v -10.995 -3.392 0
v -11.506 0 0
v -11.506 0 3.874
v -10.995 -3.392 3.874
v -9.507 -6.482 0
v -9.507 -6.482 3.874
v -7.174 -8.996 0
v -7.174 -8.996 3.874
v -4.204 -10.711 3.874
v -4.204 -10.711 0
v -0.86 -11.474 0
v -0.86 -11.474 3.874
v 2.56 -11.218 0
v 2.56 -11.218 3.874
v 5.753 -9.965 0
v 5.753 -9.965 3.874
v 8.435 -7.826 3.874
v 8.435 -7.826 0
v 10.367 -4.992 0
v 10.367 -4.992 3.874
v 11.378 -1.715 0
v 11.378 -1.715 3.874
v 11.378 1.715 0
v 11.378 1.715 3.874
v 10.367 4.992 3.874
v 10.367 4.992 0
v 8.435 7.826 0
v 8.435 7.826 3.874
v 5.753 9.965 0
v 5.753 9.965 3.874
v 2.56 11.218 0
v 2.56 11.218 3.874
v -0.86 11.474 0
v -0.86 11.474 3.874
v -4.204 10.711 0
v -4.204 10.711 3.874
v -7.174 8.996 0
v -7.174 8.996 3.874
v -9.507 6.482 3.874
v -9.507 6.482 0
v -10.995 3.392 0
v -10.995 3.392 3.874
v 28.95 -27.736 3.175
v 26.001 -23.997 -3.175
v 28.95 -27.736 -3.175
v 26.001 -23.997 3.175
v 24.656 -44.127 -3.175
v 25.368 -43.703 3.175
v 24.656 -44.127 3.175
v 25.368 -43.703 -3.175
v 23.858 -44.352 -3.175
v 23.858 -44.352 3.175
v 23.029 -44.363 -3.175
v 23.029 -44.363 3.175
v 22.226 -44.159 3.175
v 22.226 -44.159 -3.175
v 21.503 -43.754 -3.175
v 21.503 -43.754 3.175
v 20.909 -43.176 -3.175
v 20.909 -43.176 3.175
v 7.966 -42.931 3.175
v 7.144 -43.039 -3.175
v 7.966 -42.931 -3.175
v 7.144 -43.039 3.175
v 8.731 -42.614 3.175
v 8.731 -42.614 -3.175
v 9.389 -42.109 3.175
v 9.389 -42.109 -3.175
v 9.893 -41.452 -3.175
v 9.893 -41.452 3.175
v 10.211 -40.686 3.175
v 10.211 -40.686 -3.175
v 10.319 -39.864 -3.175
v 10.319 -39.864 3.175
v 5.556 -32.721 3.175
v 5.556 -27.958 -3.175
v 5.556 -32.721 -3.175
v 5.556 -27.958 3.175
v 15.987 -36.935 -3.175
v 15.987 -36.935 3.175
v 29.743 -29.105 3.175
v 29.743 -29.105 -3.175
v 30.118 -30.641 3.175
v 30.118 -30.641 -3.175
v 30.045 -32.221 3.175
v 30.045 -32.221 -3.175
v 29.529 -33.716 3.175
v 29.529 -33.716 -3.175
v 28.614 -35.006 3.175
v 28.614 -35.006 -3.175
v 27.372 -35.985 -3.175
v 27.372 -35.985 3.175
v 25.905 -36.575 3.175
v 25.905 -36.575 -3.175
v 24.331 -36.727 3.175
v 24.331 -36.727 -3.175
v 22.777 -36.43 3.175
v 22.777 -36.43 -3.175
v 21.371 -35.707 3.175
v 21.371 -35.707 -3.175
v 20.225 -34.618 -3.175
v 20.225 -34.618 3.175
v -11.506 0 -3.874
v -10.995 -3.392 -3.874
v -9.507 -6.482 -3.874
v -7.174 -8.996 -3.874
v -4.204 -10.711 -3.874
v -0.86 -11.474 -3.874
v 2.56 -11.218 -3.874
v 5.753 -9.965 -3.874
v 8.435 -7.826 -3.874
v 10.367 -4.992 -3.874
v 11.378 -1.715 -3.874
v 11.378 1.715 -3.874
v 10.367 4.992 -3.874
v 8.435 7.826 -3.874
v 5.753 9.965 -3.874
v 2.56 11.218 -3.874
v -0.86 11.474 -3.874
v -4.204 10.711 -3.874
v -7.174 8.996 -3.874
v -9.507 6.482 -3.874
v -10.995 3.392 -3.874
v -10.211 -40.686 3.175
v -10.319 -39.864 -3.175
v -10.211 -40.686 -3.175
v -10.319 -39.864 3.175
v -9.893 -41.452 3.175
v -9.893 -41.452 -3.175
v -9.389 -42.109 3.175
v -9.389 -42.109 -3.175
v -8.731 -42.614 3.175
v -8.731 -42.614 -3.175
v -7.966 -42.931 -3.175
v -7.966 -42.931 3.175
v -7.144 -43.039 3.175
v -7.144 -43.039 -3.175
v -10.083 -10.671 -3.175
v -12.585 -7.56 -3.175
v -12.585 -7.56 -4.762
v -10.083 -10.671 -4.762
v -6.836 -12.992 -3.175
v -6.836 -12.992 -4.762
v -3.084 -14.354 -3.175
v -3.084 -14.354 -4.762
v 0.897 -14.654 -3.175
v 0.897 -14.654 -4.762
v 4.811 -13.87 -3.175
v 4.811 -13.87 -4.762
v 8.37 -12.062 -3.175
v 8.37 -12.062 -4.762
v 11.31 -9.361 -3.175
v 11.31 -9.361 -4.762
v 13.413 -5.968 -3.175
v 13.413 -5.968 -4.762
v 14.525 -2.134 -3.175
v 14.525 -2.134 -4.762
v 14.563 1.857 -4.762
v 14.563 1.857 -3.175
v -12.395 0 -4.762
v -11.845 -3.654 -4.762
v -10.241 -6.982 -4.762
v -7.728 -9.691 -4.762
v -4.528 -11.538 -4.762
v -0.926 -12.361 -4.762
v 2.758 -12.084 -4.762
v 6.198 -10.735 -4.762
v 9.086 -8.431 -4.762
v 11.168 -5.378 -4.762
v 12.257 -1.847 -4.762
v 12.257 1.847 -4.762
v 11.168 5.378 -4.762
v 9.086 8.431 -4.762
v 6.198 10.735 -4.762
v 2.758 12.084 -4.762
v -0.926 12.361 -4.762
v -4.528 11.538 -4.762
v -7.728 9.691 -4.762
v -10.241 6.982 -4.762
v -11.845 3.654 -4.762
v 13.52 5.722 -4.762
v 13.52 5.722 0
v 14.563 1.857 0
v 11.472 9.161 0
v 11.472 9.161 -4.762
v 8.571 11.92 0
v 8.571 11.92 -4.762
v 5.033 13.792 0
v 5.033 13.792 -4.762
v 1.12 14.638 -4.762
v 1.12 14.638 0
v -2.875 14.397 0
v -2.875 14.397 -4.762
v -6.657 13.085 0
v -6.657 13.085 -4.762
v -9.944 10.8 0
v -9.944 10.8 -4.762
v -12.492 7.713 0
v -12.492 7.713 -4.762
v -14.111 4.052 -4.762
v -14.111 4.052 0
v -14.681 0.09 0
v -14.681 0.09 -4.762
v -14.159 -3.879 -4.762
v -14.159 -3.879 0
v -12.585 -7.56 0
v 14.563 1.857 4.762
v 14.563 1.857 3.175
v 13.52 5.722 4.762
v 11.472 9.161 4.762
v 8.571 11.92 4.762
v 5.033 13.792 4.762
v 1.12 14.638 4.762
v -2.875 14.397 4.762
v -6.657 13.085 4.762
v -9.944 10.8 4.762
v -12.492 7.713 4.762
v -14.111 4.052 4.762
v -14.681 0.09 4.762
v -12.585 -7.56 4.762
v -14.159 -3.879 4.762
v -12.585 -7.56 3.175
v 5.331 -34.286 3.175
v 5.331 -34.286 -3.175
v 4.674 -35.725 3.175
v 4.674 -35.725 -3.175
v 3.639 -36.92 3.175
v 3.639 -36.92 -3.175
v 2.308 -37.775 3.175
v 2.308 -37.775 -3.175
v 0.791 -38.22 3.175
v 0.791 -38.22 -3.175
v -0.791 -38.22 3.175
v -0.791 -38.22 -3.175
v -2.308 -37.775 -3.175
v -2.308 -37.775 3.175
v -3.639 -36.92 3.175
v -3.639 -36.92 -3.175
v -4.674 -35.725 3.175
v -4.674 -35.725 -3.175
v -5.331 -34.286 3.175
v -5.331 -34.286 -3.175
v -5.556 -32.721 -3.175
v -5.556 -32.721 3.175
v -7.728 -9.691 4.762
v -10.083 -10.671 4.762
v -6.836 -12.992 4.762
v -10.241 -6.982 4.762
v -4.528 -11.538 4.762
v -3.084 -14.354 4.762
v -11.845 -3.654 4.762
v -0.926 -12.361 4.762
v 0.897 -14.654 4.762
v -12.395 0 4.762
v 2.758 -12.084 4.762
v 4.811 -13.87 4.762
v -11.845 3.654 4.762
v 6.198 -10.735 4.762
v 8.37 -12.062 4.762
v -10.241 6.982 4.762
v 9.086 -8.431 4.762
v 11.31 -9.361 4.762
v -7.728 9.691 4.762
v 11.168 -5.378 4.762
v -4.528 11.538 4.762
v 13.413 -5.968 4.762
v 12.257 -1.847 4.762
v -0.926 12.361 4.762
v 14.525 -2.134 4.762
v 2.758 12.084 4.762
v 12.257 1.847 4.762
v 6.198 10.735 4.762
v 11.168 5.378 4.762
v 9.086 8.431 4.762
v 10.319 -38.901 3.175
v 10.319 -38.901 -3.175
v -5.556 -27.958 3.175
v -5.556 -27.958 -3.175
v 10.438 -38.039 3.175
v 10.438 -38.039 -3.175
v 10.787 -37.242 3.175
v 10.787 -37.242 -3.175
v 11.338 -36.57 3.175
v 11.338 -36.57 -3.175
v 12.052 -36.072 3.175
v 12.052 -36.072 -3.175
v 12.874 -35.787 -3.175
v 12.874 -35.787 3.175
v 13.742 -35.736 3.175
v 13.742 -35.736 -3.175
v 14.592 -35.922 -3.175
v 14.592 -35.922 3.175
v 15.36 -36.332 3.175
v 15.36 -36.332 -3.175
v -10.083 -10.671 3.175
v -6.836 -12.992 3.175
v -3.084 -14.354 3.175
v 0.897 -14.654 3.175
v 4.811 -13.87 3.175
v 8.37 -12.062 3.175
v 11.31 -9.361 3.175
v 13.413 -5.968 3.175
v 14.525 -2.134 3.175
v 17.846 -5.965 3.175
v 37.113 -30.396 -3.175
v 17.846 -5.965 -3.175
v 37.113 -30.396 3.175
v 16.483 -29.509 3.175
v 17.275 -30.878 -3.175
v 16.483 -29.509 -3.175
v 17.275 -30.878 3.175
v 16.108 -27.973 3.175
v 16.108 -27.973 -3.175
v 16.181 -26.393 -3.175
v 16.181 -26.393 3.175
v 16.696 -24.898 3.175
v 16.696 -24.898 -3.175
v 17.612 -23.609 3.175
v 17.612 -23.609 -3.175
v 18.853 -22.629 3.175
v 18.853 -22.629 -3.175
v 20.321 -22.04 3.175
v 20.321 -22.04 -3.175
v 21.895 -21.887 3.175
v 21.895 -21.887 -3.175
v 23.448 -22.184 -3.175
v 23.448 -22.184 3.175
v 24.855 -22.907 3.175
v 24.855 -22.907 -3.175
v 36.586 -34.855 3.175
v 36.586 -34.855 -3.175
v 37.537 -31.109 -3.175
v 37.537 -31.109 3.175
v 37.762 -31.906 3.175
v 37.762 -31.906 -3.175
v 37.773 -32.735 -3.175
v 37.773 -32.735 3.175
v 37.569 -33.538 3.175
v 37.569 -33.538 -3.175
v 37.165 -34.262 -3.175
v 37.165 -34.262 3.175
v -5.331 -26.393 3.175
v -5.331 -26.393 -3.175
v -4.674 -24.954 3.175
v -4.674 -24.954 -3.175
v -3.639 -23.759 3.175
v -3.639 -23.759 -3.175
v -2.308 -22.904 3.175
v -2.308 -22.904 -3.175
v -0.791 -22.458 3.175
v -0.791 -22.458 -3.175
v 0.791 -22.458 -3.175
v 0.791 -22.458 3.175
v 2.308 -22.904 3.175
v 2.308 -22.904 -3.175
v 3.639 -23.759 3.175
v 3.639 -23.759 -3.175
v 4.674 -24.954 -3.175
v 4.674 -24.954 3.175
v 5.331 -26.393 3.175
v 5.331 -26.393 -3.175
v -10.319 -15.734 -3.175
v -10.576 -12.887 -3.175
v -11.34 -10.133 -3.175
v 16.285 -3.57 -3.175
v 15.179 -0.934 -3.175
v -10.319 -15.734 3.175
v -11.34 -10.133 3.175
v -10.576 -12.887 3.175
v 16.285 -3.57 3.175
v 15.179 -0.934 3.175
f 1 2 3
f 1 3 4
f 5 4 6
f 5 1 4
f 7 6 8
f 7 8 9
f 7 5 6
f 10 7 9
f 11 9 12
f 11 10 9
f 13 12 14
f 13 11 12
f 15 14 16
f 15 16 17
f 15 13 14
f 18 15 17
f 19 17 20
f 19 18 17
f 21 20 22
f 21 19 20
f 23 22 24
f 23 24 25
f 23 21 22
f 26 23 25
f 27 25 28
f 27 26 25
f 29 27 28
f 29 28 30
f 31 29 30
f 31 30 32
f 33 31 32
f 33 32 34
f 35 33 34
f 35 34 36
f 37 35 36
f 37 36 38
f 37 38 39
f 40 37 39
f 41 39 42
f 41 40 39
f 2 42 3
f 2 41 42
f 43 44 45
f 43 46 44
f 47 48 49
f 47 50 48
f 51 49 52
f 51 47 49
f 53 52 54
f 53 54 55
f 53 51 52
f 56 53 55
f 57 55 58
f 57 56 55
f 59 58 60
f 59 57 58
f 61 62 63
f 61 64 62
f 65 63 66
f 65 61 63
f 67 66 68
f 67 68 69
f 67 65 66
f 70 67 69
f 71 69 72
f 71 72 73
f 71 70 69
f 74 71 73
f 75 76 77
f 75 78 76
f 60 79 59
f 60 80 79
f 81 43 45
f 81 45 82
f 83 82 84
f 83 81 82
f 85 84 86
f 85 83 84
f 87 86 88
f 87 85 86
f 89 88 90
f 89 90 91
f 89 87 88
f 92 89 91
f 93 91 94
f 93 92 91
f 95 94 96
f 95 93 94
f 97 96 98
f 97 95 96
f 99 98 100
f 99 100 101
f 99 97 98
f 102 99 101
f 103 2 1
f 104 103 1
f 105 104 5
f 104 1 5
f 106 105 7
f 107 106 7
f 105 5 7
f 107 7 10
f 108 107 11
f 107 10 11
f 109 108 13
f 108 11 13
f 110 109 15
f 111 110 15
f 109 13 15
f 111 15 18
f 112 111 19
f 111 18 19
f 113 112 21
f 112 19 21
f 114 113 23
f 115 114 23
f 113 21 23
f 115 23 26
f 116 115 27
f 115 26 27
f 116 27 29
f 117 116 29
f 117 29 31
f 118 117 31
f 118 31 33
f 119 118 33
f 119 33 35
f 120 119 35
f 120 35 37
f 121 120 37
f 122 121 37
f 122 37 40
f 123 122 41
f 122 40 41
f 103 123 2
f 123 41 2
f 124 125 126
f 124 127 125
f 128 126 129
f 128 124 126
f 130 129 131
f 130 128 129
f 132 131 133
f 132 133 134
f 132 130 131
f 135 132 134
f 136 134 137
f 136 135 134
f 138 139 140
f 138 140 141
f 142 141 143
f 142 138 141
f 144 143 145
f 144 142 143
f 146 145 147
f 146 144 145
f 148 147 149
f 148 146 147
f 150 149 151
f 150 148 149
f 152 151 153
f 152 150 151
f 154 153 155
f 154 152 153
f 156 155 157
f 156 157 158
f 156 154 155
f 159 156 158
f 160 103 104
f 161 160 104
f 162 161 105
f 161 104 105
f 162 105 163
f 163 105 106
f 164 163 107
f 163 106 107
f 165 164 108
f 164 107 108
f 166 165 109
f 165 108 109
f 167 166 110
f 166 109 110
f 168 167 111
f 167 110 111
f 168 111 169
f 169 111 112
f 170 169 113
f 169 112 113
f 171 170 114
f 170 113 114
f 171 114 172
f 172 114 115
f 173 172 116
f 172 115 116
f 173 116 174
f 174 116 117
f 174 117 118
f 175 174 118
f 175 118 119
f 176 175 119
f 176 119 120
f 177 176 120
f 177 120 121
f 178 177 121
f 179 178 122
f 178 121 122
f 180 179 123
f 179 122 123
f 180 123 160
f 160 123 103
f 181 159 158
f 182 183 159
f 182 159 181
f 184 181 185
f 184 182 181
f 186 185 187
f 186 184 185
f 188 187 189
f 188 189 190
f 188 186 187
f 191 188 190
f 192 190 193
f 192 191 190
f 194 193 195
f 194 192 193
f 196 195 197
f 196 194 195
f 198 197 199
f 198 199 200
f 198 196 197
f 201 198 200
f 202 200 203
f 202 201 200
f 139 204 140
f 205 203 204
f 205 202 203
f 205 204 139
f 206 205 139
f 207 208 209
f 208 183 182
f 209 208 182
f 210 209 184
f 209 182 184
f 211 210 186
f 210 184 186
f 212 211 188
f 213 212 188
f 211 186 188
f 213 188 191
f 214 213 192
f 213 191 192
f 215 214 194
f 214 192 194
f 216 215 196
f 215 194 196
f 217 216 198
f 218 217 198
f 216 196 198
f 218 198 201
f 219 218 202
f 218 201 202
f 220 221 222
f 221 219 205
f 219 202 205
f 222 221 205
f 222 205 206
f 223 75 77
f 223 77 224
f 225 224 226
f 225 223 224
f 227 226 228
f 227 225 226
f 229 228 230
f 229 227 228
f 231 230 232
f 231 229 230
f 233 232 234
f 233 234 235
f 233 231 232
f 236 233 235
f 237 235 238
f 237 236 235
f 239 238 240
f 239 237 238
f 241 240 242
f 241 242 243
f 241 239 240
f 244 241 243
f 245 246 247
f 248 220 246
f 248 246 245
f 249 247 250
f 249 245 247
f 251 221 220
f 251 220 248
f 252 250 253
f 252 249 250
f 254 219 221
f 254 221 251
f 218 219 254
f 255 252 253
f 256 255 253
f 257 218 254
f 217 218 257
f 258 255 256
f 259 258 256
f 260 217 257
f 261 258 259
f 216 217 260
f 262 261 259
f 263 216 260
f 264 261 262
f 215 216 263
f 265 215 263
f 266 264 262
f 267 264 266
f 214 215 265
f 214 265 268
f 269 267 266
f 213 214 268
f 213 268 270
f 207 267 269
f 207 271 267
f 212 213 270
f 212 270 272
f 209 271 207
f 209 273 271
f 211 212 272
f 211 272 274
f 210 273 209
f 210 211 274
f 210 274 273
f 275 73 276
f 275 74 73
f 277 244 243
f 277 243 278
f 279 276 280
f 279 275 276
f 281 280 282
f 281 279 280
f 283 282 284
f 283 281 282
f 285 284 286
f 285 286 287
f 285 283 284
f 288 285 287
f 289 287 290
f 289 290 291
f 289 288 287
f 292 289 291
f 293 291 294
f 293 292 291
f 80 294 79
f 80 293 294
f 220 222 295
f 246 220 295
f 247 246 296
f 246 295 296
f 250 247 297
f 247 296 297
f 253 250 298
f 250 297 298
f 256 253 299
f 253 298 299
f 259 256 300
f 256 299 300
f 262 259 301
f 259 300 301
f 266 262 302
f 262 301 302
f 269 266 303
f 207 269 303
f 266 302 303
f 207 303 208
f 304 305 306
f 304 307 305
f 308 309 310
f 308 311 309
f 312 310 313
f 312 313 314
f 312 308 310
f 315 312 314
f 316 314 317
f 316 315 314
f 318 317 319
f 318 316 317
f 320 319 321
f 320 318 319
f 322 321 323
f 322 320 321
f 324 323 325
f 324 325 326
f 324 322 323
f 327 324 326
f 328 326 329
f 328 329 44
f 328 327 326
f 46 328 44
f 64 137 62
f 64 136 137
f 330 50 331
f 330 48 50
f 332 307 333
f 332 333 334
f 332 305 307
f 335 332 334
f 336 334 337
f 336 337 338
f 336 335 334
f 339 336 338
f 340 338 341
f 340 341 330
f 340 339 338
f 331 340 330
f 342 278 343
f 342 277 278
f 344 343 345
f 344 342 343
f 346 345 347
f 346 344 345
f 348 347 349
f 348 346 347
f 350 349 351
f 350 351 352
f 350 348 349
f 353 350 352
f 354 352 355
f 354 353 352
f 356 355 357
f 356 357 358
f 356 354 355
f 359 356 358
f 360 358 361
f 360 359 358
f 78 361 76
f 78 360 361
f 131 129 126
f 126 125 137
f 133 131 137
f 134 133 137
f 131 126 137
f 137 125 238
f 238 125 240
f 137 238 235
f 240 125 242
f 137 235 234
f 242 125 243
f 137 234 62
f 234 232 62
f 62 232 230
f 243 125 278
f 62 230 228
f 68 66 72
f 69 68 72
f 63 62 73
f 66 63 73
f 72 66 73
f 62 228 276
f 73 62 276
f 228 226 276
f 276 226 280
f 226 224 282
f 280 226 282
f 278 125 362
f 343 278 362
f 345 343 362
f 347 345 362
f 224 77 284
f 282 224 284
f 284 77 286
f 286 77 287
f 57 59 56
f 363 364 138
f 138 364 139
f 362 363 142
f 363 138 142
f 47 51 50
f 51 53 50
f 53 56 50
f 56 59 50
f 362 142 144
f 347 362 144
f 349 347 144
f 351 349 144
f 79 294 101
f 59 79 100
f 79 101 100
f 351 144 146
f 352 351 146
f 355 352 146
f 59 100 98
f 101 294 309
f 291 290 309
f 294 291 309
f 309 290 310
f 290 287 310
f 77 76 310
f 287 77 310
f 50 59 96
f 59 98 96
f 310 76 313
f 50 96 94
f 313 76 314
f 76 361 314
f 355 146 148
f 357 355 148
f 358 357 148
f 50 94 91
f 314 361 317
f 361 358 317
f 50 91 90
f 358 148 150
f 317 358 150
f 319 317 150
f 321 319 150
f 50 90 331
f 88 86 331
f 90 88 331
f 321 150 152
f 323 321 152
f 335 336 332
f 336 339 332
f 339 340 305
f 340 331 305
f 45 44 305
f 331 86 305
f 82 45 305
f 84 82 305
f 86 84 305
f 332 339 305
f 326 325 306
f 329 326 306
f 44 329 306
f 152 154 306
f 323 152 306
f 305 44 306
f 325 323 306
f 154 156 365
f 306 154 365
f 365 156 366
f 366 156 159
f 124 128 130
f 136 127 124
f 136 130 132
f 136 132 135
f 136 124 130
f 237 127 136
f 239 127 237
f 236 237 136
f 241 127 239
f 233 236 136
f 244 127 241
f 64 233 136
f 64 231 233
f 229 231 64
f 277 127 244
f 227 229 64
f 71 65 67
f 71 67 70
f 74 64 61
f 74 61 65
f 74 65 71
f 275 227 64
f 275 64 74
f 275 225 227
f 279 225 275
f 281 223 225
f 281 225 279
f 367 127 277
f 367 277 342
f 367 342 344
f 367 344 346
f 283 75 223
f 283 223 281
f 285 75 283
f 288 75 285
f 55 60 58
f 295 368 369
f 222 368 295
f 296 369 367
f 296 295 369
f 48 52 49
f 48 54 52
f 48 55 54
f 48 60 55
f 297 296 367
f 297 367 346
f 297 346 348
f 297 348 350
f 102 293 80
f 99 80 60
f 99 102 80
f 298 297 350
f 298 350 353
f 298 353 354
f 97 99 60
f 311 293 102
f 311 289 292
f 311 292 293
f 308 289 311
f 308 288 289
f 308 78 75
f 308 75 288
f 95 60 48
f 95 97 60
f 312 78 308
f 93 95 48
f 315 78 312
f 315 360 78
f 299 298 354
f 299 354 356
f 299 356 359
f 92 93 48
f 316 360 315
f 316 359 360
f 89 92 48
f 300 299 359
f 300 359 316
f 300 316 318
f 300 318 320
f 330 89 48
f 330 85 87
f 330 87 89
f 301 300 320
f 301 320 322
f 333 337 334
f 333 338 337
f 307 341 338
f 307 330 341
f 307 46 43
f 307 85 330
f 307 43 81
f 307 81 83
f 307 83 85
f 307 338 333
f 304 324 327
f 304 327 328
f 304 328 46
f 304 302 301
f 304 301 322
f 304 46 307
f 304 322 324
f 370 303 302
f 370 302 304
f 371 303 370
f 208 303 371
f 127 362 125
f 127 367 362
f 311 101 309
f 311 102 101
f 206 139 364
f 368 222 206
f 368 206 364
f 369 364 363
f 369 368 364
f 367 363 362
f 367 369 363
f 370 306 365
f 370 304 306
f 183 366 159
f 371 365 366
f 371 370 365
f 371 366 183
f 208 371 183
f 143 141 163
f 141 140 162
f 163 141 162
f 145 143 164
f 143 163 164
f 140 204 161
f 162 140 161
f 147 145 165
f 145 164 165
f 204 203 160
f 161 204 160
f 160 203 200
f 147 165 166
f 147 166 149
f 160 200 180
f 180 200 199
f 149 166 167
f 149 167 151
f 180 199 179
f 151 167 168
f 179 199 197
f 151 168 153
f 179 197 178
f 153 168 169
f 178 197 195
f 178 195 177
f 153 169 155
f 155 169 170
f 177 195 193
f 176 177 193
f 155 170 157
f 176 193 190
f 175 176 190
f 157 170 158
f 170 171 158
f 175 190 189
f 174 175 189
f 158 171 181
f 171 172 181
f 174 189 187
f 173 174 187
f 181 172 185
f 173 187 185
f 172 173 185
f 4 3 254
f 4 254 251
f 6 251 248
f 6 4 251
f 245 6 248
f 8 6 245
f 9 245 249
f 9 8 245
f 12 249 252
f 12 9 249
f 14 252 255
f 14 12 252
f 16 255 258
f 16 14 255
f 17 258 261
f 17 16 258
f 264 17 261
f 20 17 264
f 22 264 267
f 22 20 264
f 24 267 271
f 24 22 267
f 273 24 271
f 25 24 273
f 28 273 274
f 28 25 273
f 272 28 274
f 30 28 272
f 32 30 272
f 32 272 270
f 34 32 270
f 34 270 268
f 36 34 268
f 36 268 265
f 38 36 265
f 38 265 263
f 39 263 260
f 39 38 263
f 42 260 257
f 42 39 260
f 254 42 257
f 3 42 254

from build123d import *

# Parameters (mm, degrees)
SKETCH1_R           = 11.5062
BOSS_EXTRUDE2_DEPTH = 4.7625
BOSS_EXTRUDE3_DEPTH = 3.175
FILLET1_R           = 3.175
CHAMFER1_SIZE       = 0.889


with BuildPart() as part:
    # Sketch1 → Boss-Extrude2 (new, symmetric)
    with BuildSketch(Plane.XY):
        with BuildLine():
            ThreePointArc((14.563243761, 1.857300354), (-4.811299793, 13.870437187), (-12.585193267, -7.559797873))
            ThreePointArc((-12.585193267, -7.559797873), (4.811299793, -13.870437187), (14.563243761, 1.857300354))
        make_face()
        Circle(SKETCH1_R, mode=Mode.SUBTRACT)
    extrude(amount=BOSS_EXTRUDE2_DEPTH, both=True)

    # Sketch1<4> → Boss-Extrude3 (add, symmetric)
    with BuildSketch(Plane.XY):
        with BuildLine():
            ThreePointArc((-12.585193267, -7.559797873), (-10.89585042, -11.492870345), (-10.31875, -15.734319794))
            Line((-10.31875, -15.734319794), (-10.31875, -43.039319794))
            Line((-10.31875, -43.039319794), (10.31875, -43.039319794))
            Line((10.31875, -43.039319794), (10.31875, -29.747797869))
            Line((10.31875, -29.747797869), (22.874796512, -45.668948499))
            Line((22.874796512, -45.668948499), (39.079387582, -32.889369691))
            Line((39.079387582, -32.889369691), (17.84562587, -5.964818374))
            ThreePointArc((17.84562587, -5.964818374), (15.672287957, -2.277062873), (14.563243761, 1.857300354))
            ThreePointArc((14.563243761, 1.857300354), (4.811299793, -13.870437187), (-12.585193267, -7.559797873))
        make_face()
        with BuildLine():
            ThreePointArc((5.55625, -32.720569794), (0, -38.276819794), (-5.55625, -32.720569794))
            Line((-5.55625, -32.720569794), (-5.55625, -27.958069794))
            ThreePointArc((-5.55625, -27.958069794), (0, -22.401819794), (5.55625, -27.958069794))
            Line((5.55625, -27.958069794), (5.55625, -32.720569794))
        make_face(mode=Mode.SUBTRACT)
        with BuildLine():
            ThreePointArc((28.950077162, -27.736207727), (28.027958476, -35.539638078), (20.224528124, -34.617519392))
            Line((20.224528124, -34.617519392), (17.275394553, -30.877998376))
            ThreePointArc((17.275394553, -30.877998376), (18.197513239, -23.074568025), (26.000943591, -23.996686711))
            Line((26.000943591, -23.996686711), (28.950077162, -27.736207727))
        make_face(mode=Mode.SUBTRACT)
    extrude(amount=BOSS_EXTRUDE3_DEPTH, both=True)

    # Fillet1
    fillet1_edges = [part.edges().sort_by_distance(p)[0] for p in [
        (-10.31875, -43.039319794, 0),
        (39.079387582, -32.889369691, 0),
        (10.31875, -43.039319794, 0),
        (22.874796512, -45.668948499, 0),
        (10.31875, -29.747797869, 0),
    ]]
    fillet(fillet1_edges, radius=FILLET1_R)

    # Chamfer1
    chamfer1_edges = [part.edges().sort_by_distance(p)[0] for p in [
        (-11.5062, 0, -4.7625),
        (-11.5062, 0, 4.7625),
    ]]
    chamfer(chamfer1_edges, length=CHAMFER1_SIZE)


solid = part.part
